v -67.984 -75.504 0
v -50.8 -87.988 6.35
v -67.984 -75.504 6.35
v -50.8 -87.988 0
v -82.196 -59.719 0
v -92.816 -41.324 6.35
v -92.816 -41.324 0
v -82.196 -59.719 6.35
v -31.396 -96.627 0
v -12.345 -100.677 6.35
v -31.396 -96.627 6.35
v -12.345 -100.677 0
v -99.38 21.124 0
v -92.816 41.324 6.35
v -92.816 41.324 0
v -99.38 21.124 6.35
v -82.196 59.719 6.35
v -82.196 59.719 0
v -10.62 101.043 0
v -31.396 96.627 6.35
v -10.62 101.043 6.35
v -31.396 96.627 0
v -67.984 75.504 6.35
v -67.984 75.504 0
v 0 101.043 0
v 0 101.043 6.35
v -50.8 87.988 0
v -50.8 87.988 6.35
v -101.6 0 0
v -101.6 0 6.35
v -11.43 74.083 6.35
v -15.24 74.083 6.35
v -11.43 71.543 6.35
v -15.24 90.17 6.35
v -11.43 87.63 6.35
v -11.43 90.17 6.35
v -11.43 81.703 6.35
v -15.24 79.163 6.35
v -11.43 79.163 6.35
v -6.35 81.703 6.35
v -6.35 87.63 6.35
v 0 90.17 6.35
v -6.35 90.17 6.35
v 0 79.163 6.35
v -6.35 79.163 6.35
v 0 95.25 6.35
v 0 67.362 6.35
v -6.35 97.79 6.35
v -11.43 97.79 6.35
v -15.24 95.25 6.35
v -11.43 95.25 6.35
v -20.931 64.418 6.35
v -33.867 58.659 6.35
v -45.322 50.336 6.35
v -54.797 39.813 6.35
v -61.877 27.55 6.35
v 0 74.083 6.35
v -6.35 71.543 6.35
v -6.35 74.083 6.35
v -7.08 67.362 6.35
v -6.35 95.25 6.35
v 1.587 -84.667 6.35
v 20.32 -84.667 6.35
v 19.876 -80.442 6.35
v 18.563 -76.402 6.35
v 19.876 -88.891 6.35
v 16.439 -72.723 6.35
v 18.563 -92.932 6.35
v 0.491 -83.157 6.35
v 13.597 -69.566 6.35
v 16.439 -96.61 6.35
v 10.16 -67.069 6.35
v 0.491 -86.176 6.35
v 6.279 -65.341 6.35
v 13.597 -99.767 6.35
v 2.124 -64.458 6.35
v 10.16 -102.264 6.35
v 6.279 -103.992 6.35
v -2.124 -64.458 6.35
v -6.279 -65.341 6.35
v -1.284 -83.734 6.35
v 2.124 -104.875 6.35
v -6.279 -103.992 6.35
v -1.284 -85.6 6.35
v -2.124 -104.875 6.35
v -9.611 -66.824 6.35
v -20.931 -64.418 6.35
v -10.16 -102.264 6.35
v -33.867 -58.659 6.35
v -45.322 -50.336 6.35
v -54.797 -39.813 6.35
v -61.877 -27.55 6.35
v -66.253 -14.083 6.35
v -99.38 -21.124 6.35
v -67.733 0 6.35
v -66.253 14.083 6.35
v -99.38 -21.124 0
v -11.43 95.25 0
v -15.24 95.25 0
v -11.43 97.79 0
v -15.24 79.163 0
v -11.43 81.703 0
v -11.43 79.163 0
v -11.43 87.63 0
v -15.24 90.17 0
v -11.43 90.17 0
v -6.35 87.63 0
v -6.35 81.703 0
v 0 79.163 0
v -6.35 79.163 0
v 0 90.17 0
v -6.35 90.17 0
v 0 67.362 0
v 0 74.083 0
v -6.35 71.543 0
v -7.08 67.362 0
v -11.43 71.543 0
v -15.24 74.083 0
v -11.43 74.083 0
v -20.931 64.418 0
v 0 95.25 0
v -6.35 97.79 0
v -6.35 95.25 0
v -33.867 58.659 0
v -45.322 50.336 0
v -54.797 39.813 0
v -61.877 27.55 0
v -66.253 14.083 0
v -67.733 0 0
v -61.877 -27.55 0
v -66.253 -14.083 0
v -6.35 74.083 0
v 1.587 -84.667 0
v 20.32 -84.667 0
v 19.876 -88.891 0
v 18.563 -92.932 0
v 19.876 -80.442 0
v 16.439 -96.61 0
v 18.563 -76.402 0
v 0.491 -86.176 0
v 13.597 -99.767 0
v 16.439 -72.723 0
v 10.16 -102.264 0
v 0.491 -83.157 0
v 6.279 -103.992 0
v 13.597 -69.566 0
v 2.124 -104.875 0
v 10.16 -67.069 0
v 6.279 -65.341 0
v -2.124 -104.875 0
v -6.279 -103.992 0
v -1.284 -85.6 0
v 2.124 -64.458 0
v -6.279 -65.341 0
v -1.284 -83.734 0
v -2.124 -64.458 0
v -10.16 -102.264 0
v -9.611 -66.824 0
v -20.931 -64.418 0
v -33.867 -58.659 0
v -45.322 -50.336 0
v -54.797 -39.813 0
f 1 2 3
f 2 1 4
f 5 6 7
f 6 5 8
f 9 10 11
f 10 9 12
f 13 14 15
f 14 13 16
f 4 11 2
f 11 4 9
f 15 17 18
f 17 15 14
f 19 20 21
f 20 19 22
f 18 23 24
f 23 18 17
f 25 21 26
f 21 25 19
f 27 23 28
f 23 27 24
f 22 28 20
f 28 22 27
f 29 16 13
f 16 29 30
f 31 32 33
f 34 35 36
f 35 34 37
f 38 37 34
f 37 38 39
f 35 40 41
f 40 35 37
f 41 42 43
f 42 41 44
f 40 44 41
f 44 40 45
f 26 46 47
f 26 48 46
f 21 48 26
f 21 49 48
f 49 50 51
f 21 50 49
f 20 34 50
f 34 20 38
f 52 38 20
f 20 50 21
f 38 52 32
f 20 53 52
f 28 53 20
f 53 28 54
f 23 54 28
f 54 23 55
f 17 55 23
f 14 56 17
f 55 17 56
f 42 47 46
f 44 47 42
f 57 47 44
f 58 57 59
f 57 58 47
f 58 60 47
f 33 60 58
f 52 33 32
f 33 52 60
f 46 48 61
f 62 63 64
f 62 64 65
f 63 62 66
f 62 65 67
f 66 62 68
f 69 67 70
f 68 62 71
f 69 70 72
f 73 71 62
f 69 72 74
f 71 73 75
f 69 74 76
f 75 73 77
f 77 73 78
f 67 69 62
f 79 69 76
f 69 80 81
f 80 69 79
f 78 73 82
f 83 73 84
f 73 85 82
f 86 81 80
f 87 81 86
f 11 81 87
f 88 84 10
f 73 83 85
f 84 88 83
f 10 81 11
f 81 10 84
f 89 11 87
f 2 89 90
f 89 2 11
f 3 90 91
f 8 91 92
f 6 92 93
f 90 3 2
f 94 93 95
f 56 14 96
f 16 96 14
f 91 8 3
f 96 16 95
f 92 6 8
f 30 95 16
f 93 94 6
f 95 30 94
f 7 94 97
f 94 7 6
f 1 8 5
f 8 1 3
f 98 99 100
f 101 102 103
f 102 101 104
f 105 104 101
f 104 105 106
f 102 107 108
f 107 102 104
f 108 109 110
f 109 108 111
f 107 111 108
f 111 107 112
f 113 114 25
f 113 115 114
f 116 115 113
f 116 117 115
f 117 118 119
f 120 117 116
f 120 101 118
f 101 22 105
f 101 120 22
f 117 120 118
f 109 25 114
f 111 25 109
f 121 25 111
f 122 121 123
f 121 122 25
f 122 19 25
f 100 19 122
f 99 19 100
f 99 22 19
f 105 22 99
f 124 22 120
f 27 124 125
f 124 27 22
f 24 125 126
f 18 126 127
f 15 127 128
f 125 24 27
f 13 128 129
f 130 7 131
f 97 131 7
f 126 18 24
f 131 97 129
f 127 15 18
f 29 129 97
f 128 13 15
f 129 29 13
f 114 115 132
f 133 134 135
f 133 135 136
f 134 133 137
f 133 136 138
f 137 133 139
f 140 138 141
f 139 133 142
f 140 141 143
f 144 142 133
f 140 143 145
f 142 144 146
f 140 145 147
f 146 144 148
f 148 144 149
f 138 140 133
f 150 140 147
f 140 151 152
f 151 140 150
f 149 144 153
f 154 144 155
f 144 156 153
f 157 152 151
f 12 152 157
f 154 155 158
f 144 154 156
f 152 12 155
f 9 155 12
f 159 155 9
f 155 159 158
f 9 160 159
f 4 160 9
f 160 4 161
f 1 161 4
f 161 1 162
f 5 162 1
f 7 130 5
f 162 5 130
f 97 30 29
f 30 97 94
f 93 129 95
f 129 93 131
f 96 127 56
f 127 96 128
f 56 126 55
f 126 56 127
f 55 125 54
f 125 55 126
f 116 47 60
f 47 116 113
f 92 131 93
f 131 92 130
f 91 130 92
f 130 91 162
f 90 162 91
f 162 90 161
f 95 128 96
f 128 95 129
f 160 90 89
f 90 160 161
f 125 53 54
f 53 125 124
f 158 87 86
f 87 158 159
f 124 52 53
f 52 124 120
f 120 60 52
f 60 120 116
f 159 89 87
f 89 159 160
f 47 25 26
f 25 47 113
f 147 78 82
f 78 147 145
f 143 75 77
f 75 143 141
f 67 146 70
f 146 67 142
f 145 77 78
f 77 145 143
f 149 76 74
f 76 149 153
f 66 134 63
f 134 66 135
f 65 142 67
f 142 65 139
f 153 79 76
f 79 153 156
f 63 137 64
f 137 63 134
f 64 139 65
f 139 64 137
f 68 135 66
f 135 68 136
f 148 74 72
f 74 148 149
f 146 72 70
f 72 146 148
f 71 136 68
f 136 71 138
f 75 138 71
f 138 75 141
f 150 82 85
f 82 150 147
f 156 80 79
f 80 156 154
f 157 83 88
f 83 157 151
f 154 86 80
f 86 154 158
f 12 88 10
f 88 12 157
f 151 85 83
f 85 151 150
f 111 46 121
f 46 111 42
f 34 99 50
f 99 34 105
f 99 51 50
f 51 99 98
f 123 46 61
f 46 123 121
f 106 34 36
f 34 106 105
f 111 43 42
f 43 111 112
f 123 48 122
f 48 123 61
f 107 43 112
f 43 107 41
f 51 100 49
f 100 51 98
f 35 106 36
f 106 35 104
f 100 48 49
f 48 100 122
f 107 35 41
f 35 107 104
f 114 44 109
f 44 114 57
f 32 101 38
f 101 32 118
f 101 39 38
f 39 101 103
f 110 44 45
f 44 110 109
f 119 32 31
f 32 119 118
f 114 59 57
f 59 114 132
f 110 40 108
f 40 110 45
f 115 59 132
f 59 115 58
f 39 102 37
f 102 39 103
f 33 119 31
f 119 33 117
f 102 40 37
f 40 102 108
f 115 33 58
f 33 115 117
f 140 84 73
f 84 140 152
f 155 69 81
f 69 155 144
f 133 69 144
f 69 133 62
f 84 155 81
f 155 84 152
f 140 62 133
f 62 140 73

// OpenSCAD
    function mm(i) = i*25.4; 
    thickness = mm(.25); 
    radius = mm(4); 
	 screwWidth = mm(.2);
	 screwDepth = mm(.6);
	 nutWidth = mm(.4);
	 nutDepth = mm(.2);
	 motorHole = mm(1/16);
    
    
module baseleg(thickness=mm(.25), radius=mm(4)) 
    { 
       union()
		{
			 difference() 
         { 
              cylinder(thickness, radius, radius, 0); 
    
              translate([0, 0, -1]) 
              { 
                   cylinder(thickness+2, radius*2/3, radius*2/3, 0); 
    
              } 
					translate([0, -radius, -1]) 
					{
						cube([radius, radius*2, thickness+2]);
         		}
					
         	}
		translate([0, -radius+(radius-radius*2/3)/2, 0]) 
		{			
			cylinder(thickness, radius*.2, radius*.2,0);
		}	

	}
 }   
    
module holes(screwWidth=mm(.2),screwDepth=mm(.6),nutWidth=mm(.4),nutDepth=mm(.2),motorHole=mm(1/16))
{
	translate([-screwDepth,radius-screwWidth-mm(.25),-1])
		{
		rotate([0,0,0])
			{
			union()
				{
					cube ([screwDepth, screwWidth, thickness+2]);
					translate([screwDepth/4, -(nutWidth-screwWidth)/2, 0])
						{
						cube ([nutDepth, nutWidth, thickness+2]); 
						}
				}
			}
		}
	translate([-screwDepth,radius-(radius-2*radius/3)+mm(.25),-1])
		{
		rotate([0,0,0])
			{
			union()
				{
					cube ([screwDepth, screwWidth, thickness+2]);
					translate([screwDepth/4, -(nutWidth-screwWidth)/2, 0])
						{
						cube ([nutDepth, nutWidth, thickness+2]); 
						}
				}
			}
		}
	translate([0,-radius+(radius-2*radius/3)/2,-1])
		{
			cylinder(thickness+2, motorHole, motorHole, 0);
		}
} 
    
    
module gripleg()
{
	difference()
		{
			baseleg();
			holes();
		}
}

   
gripleg();
